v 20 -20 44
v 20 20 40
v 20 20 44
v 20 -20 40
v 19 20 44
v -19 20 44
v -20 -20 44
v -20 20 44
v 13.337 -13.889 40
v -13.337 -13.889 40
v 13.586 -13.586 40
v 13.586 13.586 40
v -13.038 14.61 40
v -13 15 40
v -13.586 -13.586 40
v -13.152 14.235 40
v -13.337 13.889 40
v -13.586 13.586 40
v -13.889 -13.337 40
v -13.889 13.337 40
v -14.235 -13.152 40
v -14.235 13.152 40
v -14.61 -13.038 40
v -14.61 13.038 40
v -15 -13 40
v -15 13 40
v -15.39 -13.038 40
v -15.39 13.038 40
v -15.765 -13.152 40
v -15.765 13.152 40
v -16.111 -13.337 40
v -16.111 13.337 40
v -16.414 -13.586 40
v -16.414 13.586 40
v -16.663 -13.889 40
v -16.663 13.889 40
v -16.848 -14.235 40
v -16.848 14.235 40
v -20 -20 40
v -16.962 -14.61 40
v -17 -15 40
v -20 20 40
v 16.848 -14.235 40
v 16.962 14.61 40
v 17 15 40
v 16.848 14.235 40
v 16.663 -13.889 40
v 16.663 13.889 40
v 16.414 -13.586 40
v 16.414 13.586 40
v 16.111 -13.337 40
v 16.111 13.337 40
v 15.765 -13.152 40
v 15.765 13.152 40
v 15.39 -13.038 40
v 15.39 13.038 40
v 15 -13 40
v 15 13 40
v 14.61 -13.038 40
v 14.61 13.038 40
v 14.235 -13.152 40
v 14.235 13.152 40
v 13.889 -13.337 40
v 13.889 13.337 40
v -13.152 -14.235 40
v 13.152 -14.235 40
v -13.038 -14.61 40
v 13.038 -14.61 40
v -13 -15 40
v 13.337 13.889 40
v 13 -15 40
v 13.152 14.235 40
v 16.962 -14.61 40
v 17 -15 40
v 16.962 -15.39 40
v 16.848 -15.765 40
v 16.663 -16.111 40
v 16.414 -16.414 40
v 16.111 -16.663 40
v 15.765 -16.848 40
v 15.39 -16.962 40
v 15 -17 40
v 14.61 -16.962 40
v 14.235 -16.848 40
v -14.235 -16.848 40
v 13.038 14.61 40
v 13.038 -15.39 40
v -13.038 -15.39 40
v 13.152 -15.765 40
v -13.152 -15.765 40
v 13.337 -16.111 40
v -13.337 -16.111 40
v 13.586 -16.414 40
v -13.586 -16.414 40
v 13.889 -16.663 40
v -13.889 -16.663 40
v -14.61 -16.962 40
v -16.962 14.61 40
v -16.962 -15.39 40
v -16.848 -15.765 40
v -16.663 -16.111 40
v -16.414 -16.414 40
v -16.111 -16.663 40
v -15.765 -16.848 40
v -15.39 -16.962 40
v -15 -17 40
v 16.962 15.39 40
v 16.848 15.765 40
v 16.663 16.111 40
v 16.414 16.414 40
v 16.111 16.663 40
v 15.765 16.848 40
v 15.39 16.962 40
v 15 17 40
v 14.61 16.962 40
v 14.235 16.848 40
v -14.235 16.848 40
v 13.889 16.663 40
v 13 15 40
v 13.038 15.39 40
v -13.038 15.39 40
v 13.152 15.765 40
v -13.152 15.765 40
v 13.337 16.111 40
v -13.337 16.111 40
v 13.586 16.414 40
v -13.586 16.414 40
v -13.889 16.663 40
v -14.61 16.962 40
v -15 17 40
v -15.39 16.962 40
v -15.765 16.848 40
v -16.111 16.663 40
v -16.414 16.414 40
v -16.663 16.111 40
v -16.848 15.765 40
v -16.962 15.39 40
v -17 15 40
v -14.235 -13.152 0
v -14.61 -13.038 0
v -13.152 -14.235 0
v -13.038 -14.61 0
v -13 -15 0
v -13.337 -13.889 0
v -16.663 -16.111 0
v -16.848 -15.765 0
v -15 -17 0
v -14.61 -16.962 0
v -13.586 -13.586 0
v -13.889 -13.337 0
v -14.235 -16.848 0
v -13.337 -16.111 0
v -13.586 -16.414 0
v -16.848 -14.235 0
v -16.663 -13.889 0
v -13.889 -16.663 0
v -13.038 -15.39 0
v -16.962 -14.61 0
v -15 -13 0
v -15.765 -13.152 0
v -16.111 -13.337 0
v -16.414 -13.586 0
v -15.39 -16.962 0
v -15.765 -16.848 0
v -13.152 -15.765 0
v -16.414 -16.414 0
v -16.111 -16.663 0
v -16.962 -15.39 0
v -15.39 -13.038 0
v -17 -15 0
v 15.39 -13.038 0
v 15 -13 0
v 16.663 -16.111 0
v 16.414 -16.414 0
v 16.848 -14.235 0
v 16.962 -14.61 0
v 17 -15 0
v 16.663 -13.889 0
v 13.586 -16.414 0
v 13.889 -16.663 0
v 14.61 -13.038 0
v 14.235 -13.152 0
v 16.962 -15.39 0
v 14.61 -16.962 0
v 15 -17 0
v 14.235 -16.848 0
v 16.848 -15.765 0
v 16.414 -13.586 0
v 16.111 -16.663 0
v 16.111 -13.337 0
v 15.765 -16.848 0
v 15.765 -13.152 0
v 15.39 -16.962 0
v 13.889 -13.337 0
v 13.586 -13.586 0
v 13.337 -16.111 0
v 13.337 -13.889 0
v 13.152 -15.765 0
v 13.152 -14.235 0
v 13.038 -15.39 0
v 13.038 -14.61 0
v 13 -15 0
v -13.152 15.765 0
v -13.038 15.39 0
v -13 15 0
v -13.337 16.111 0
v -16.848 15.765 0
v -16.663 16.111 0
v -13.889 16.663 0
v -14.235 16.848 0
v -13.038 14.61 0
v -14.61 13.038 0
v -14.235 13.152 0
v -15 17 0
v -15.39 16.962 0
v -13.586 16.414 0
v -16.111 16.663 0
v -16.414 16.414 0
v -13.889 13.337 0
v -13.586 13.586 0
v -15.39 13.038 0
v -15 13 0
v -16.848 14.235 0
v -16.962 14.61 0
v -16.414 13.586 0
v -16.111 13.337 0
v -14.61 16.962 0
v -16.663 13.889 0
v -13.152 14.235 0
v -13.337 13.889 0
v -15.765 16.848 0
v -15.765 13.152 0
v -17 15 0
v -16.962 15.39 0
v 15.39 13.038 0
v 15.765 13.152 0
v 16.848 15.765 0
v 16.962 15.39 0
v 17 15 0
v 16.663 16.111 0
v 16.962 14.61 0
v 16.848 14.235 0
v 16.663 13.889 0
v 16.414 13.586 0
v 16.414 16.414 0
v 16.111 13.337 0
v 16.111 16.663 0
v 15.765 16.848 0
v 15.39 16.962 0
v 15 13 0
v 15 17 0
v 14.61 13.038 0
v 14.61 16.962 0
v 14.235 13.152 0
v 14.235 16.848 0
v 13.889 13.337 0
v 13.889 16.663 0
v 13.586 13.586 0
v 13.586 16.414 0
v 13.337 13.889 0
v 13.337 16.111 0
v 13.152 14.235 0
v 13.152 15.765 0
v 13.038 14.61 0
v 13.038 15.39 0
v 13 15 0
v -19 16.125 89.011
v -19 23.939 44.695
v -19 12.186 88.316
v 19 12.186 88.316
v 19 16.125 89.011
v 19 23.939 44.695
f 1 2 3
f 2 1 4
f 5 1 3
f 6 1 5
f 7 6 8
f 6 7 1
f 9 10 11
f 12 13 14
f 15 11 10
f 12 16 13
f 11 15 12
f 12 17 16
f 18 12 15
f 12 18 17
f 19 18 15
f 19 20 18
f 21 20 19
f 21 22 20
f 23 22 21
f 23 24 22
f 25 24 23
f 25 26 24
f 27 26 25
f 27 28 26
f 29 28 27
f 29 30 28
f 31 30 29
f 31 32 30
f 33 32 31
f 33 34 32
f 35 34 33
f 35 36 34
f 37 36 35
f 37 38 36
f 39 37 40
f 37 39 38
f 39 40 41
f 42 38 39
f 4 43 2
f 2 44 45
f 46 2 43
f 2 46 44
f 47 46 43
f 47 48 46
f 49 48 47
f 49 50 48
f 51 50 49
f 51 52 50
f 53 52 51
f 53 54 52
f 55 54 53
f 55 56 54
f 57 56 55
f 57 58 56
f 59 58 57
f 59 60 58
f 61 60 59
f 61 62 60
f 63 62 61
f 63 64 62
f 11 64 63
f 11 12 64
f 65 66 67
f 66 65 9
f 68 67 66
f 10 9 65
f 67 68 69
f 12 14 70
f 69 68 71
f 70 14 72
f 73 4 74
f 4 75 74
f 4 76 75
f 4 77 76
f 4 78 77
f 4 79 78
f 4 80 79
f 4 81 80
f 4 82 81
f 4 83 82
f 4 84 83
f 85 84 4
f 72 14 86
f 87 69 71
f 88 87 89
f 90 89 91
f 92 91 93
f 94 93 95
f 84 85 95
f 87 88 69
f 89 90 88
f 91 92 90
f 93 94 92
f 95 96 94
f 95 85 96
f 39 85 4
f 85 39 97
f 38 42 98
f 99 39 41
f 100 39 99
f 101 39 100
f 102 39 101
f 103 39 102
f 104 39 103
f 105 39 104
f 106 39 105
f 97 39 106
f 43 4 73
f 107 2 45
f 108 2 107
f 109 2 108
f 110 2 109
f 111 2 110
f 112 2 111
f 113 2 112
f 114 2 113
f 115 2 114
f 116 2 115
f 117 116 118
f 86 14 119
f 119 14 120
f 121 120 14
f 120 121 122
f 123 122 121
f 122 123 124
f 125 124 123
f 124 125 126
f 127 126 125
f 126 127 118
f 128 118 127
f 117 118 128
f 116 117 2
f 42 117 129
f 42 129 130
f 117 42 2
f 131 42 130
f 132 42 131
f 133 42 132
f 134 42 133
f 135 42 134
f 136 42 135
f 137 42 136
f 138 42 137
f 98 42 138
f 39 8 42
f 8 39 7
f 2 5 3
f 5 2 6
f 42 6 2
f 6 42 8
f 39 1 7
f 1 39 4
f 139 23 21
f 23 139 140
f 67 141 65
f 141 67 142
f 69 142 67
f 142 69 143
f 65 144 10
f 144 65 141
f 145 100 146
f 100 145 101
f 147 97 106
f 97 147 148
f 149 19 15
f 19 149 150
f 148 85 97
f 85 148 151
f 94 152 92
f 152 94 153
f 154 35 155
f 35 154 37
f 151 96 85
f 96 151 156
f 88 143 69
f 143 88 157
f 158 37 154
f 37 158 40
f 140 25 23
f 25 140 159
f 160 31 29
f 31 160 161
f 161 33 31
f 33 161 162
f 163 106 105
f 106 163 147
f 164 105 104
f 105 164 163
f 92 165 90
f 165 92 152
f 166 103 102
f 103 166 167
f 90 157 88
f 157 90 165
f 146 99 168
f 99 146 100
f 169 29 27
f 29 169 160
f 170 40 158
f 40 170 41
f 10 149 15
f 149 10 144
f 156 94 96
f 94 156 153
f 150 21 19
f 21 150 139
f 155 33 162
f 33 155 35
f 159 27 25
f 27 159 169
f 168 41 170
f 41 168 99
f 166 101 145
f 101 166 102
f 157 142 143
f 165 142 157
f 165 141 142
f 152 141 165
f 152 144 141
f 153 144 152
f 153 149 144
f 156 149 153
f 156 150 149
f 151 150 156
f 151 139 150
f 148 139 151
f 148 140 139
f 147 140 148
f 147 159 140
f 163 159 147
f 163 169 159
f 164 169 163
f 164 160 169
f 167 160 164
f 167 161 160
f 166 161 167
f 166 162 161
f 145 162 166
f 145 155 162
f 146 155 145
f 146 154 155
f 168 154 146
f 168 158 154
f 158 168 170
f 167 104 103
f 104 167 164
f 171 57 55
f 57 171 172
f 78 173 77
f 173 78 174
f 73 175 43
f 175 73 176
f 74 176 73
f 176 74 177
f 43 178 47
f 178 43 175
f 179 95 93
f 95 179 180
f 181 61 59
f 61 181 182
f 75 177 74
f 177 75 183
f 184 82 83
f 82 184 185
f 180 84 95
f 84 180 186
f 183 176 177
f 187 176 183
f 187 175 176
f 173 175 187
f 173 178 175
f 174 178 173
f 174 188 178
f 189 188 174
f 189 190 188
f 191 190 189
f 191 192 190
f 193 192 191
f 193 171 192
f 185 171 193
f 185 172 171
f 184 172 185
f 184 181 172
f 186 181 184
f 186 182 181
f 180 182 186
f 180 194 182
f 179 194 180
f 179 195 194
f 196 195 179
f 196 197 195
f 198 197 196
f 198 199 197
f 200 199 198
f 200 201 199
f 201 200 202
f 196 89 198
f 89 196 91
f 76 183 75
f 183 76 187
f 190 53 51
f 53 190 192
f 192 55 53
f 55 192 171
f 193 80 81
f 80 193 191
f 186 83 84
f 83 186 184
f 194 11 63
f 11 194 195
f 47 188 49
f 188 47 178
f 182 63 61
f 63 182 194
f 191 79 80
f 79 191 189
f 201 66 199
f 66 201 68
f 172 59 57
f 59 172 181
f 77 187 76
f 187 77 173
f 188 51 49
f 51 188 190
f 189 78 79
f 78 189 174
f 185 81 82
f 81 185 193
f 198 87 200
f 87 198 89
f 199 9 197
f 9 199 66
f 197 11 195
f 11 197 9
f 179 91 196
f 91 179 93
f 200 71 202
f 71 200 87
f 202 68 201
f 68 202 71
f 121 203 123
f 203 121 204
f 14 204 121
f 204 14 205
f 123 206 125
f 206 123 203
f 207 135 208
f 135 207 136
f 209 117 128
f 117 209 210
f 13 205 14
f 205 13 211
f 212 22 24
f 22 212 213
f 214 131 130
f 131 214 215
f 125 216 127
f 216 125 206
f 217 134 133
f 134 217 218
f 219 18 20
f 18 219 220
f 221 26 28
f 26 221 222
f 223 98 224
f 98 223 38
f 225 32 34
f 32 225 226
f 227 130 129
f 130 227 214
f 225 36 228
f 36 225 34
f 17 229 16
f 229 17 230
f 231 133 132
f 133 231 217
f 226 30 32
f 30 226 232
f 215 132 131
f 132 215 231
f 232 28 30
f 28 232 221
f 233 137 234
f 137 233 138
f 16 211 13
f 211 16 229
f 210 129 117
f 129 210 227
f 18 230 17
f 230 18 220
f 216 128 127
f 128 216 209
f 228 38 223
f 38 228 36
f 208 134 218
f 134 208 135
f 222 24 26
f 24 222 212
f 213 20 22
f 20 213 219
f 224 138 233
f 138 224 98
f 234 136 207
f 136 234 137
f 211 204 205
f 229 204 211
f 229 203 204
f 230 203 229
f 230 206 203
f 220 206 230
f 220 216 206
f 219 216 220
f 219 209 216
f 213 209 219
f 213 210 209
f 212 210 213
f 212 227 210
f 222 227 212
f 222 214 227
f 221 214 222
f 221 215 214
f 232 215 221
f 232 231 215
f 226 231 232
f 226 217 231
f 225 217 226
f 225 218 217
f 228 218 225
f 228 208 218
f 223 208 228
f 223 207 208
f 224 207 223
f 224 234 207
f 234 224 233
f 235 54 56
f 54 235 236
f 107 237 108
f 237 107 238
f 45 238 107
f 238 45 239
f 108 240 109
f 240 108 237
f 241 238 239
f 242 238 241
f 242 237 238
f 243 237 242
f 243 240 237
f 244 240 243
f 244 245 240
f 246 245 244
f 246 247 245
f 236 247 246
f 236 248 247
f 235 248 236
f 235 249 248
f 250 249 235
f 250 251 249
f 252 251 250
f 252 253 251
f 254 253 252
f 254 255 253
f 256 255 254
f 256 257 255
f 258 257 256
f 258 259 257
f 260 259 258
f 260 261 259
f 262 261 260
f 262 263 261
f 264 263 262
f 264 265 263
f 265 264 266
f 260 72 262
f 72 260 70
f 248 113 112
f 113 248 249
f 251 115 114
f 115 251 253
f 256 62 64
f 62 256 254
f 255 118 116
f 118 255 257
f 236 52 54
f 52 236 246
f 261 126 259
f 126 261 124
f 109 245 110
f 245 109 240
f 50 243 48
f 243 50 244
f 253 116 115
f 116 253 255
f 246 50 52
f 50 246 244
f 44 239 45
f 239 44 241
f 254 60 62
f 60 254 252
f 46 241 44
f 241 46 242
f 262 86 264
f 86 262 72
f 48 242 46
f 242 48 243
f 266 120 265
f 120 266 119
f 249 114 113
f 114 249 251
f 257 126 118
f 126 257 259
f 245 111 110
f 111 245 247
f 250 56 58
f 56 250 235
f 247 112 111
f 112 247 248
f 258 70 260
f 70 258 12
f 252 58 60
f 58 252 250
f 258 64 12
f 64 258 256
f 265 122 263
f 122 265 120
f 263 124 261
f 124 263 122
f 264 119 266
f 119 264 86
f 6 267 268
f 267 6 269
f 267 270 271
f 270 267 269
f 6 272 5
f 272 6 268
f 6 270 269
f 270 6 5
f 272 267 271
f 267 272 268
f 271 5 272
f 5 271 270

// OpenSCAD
// Simple Modern Chair
// Design by an AI CAD Engineer

// --- Parameters ---
// General chair dimensions
seat_width = 40;          // Width of the seat (along X-axis)
seat_depth = 40;          // Depth of the seat (along Y-axis)
seat_thickness = 4;       // Thickness of the seat plate

// Leg properties
leg_diameter = 4;         // Diameter of the cylindrical legs
leg_height = 40;          // Height of the legs (floor to bottom of seat)
leg_inset = 3;            // Distance legs are inset from the seat edges

// Backrest properties
backrest_width_factor = 0.95; // Backrest width as a factor of seat_width
backrest_height = 45;     // Height of the backrest panel (from seat surface)
backrest_thickness = seat_thickness; // Thickness of the backrest panel
backrest_angle = 10;      // Backwards tilt angle of the backrest in degrees

// --- Quality Settings ---
// $fn is used by cylinder() for number of facets. Higher is smoother.
cylinder_fn = 32;

// --- Derived Parameters (calculated from primary parameters) ---
backrest_actual_width = seat_width * backrest_width_factor; // Actual width of the backrest

// --- Component Modules ---

// Module for the seat
module seat_component() {
    // The seat is a simple cube.
    // It's centered horizontally (X, Y axes).
    // Its bottom surface is positioned at Z = leg_height.
    // So, its center is at Z = leg_height + seat_thickness / 2.
    translate([0, 0, leg_height + seat_thickness / 2])
        cube([seat_width, seat_depth, seat_thickness], center = true);
}

// Module for a single leg
// The leg is a cylinder.
// Its origin (0,0,0 within this module) is at the center of its bottom face.
module leg_component() {
    cylinder(h = leg_height, d = leg_diameter, $fn = cylinder_fn);
}

// Module for the backrest
module backrest_component() {
    // The backrest is positioned and rotated relative to the seat's top-rear edge.
    // The rotation axis for the tilt is along the X-direction,
    // located at Y = seat_depth / 2 (rear edge of the seat),
    // and Z = leg_height + seat_thickness (top surface of the seat).
    
    base_z_position = leg_height + seat_thickness;
    base_y_position = seat_depth / 2;

    // Translate to the pivot point on the seat's rear edge
    translate([0, base_y_position, base_z_position]) {
        // Rotate for the backrest tilt
        rotate([backrest_angle, 0, 0]) {
            // Create the backrest cube itself.
            // In its own local coordinate system (before transformations in this module):
            // - It's centered along its width (X-axis).
            // - Its "front" face (surface towards the seat center) is at Y = 0.
            // - Its "bottom" face (surface resting on the seat) is at Z = 0.
            translate([-backrest_actual_width / 2, 0, 0])
                cube([backrest_actual_width, backrest_thickness, backrest_height]);
        }
    }
}

// --- Main Chair Assembly Module ---
module chair() {
    // Add the seat
    seat_component();

    // Calculate the XY offset for placing the center of each leg.
    // This positions the legs relative to the chair's center (0,0).
    leg_center_offset_x = seat_width / 2 - leg_diameter / 2 - leg_inset;
    leg_center_offset_y = seat_depth / 2 - leg_diameter / 2 - leg_inset;

    // Place the four legs
    // Front-left leg
    translate([-leg_center_offset_x, -leg_center_offset_y, 0])
        leg_component();

    // Front-right leg
    translate([leg_center_offset_x, -leg_center_offset_y, 0])
        leg_component();

    // Back-left leg
    translate([-leg_center_offset_x, leg_center_offset_y, 0])
        leg_component();

    // Back-right leg
    translate([leg_center_offset_x, leg_center_offset_y, 0])
        leg_component();
    
    // Add the backrest
    backrest_component();
}

// --- Instantiate the Chair ---
// This line creates the chair model.
chair();
